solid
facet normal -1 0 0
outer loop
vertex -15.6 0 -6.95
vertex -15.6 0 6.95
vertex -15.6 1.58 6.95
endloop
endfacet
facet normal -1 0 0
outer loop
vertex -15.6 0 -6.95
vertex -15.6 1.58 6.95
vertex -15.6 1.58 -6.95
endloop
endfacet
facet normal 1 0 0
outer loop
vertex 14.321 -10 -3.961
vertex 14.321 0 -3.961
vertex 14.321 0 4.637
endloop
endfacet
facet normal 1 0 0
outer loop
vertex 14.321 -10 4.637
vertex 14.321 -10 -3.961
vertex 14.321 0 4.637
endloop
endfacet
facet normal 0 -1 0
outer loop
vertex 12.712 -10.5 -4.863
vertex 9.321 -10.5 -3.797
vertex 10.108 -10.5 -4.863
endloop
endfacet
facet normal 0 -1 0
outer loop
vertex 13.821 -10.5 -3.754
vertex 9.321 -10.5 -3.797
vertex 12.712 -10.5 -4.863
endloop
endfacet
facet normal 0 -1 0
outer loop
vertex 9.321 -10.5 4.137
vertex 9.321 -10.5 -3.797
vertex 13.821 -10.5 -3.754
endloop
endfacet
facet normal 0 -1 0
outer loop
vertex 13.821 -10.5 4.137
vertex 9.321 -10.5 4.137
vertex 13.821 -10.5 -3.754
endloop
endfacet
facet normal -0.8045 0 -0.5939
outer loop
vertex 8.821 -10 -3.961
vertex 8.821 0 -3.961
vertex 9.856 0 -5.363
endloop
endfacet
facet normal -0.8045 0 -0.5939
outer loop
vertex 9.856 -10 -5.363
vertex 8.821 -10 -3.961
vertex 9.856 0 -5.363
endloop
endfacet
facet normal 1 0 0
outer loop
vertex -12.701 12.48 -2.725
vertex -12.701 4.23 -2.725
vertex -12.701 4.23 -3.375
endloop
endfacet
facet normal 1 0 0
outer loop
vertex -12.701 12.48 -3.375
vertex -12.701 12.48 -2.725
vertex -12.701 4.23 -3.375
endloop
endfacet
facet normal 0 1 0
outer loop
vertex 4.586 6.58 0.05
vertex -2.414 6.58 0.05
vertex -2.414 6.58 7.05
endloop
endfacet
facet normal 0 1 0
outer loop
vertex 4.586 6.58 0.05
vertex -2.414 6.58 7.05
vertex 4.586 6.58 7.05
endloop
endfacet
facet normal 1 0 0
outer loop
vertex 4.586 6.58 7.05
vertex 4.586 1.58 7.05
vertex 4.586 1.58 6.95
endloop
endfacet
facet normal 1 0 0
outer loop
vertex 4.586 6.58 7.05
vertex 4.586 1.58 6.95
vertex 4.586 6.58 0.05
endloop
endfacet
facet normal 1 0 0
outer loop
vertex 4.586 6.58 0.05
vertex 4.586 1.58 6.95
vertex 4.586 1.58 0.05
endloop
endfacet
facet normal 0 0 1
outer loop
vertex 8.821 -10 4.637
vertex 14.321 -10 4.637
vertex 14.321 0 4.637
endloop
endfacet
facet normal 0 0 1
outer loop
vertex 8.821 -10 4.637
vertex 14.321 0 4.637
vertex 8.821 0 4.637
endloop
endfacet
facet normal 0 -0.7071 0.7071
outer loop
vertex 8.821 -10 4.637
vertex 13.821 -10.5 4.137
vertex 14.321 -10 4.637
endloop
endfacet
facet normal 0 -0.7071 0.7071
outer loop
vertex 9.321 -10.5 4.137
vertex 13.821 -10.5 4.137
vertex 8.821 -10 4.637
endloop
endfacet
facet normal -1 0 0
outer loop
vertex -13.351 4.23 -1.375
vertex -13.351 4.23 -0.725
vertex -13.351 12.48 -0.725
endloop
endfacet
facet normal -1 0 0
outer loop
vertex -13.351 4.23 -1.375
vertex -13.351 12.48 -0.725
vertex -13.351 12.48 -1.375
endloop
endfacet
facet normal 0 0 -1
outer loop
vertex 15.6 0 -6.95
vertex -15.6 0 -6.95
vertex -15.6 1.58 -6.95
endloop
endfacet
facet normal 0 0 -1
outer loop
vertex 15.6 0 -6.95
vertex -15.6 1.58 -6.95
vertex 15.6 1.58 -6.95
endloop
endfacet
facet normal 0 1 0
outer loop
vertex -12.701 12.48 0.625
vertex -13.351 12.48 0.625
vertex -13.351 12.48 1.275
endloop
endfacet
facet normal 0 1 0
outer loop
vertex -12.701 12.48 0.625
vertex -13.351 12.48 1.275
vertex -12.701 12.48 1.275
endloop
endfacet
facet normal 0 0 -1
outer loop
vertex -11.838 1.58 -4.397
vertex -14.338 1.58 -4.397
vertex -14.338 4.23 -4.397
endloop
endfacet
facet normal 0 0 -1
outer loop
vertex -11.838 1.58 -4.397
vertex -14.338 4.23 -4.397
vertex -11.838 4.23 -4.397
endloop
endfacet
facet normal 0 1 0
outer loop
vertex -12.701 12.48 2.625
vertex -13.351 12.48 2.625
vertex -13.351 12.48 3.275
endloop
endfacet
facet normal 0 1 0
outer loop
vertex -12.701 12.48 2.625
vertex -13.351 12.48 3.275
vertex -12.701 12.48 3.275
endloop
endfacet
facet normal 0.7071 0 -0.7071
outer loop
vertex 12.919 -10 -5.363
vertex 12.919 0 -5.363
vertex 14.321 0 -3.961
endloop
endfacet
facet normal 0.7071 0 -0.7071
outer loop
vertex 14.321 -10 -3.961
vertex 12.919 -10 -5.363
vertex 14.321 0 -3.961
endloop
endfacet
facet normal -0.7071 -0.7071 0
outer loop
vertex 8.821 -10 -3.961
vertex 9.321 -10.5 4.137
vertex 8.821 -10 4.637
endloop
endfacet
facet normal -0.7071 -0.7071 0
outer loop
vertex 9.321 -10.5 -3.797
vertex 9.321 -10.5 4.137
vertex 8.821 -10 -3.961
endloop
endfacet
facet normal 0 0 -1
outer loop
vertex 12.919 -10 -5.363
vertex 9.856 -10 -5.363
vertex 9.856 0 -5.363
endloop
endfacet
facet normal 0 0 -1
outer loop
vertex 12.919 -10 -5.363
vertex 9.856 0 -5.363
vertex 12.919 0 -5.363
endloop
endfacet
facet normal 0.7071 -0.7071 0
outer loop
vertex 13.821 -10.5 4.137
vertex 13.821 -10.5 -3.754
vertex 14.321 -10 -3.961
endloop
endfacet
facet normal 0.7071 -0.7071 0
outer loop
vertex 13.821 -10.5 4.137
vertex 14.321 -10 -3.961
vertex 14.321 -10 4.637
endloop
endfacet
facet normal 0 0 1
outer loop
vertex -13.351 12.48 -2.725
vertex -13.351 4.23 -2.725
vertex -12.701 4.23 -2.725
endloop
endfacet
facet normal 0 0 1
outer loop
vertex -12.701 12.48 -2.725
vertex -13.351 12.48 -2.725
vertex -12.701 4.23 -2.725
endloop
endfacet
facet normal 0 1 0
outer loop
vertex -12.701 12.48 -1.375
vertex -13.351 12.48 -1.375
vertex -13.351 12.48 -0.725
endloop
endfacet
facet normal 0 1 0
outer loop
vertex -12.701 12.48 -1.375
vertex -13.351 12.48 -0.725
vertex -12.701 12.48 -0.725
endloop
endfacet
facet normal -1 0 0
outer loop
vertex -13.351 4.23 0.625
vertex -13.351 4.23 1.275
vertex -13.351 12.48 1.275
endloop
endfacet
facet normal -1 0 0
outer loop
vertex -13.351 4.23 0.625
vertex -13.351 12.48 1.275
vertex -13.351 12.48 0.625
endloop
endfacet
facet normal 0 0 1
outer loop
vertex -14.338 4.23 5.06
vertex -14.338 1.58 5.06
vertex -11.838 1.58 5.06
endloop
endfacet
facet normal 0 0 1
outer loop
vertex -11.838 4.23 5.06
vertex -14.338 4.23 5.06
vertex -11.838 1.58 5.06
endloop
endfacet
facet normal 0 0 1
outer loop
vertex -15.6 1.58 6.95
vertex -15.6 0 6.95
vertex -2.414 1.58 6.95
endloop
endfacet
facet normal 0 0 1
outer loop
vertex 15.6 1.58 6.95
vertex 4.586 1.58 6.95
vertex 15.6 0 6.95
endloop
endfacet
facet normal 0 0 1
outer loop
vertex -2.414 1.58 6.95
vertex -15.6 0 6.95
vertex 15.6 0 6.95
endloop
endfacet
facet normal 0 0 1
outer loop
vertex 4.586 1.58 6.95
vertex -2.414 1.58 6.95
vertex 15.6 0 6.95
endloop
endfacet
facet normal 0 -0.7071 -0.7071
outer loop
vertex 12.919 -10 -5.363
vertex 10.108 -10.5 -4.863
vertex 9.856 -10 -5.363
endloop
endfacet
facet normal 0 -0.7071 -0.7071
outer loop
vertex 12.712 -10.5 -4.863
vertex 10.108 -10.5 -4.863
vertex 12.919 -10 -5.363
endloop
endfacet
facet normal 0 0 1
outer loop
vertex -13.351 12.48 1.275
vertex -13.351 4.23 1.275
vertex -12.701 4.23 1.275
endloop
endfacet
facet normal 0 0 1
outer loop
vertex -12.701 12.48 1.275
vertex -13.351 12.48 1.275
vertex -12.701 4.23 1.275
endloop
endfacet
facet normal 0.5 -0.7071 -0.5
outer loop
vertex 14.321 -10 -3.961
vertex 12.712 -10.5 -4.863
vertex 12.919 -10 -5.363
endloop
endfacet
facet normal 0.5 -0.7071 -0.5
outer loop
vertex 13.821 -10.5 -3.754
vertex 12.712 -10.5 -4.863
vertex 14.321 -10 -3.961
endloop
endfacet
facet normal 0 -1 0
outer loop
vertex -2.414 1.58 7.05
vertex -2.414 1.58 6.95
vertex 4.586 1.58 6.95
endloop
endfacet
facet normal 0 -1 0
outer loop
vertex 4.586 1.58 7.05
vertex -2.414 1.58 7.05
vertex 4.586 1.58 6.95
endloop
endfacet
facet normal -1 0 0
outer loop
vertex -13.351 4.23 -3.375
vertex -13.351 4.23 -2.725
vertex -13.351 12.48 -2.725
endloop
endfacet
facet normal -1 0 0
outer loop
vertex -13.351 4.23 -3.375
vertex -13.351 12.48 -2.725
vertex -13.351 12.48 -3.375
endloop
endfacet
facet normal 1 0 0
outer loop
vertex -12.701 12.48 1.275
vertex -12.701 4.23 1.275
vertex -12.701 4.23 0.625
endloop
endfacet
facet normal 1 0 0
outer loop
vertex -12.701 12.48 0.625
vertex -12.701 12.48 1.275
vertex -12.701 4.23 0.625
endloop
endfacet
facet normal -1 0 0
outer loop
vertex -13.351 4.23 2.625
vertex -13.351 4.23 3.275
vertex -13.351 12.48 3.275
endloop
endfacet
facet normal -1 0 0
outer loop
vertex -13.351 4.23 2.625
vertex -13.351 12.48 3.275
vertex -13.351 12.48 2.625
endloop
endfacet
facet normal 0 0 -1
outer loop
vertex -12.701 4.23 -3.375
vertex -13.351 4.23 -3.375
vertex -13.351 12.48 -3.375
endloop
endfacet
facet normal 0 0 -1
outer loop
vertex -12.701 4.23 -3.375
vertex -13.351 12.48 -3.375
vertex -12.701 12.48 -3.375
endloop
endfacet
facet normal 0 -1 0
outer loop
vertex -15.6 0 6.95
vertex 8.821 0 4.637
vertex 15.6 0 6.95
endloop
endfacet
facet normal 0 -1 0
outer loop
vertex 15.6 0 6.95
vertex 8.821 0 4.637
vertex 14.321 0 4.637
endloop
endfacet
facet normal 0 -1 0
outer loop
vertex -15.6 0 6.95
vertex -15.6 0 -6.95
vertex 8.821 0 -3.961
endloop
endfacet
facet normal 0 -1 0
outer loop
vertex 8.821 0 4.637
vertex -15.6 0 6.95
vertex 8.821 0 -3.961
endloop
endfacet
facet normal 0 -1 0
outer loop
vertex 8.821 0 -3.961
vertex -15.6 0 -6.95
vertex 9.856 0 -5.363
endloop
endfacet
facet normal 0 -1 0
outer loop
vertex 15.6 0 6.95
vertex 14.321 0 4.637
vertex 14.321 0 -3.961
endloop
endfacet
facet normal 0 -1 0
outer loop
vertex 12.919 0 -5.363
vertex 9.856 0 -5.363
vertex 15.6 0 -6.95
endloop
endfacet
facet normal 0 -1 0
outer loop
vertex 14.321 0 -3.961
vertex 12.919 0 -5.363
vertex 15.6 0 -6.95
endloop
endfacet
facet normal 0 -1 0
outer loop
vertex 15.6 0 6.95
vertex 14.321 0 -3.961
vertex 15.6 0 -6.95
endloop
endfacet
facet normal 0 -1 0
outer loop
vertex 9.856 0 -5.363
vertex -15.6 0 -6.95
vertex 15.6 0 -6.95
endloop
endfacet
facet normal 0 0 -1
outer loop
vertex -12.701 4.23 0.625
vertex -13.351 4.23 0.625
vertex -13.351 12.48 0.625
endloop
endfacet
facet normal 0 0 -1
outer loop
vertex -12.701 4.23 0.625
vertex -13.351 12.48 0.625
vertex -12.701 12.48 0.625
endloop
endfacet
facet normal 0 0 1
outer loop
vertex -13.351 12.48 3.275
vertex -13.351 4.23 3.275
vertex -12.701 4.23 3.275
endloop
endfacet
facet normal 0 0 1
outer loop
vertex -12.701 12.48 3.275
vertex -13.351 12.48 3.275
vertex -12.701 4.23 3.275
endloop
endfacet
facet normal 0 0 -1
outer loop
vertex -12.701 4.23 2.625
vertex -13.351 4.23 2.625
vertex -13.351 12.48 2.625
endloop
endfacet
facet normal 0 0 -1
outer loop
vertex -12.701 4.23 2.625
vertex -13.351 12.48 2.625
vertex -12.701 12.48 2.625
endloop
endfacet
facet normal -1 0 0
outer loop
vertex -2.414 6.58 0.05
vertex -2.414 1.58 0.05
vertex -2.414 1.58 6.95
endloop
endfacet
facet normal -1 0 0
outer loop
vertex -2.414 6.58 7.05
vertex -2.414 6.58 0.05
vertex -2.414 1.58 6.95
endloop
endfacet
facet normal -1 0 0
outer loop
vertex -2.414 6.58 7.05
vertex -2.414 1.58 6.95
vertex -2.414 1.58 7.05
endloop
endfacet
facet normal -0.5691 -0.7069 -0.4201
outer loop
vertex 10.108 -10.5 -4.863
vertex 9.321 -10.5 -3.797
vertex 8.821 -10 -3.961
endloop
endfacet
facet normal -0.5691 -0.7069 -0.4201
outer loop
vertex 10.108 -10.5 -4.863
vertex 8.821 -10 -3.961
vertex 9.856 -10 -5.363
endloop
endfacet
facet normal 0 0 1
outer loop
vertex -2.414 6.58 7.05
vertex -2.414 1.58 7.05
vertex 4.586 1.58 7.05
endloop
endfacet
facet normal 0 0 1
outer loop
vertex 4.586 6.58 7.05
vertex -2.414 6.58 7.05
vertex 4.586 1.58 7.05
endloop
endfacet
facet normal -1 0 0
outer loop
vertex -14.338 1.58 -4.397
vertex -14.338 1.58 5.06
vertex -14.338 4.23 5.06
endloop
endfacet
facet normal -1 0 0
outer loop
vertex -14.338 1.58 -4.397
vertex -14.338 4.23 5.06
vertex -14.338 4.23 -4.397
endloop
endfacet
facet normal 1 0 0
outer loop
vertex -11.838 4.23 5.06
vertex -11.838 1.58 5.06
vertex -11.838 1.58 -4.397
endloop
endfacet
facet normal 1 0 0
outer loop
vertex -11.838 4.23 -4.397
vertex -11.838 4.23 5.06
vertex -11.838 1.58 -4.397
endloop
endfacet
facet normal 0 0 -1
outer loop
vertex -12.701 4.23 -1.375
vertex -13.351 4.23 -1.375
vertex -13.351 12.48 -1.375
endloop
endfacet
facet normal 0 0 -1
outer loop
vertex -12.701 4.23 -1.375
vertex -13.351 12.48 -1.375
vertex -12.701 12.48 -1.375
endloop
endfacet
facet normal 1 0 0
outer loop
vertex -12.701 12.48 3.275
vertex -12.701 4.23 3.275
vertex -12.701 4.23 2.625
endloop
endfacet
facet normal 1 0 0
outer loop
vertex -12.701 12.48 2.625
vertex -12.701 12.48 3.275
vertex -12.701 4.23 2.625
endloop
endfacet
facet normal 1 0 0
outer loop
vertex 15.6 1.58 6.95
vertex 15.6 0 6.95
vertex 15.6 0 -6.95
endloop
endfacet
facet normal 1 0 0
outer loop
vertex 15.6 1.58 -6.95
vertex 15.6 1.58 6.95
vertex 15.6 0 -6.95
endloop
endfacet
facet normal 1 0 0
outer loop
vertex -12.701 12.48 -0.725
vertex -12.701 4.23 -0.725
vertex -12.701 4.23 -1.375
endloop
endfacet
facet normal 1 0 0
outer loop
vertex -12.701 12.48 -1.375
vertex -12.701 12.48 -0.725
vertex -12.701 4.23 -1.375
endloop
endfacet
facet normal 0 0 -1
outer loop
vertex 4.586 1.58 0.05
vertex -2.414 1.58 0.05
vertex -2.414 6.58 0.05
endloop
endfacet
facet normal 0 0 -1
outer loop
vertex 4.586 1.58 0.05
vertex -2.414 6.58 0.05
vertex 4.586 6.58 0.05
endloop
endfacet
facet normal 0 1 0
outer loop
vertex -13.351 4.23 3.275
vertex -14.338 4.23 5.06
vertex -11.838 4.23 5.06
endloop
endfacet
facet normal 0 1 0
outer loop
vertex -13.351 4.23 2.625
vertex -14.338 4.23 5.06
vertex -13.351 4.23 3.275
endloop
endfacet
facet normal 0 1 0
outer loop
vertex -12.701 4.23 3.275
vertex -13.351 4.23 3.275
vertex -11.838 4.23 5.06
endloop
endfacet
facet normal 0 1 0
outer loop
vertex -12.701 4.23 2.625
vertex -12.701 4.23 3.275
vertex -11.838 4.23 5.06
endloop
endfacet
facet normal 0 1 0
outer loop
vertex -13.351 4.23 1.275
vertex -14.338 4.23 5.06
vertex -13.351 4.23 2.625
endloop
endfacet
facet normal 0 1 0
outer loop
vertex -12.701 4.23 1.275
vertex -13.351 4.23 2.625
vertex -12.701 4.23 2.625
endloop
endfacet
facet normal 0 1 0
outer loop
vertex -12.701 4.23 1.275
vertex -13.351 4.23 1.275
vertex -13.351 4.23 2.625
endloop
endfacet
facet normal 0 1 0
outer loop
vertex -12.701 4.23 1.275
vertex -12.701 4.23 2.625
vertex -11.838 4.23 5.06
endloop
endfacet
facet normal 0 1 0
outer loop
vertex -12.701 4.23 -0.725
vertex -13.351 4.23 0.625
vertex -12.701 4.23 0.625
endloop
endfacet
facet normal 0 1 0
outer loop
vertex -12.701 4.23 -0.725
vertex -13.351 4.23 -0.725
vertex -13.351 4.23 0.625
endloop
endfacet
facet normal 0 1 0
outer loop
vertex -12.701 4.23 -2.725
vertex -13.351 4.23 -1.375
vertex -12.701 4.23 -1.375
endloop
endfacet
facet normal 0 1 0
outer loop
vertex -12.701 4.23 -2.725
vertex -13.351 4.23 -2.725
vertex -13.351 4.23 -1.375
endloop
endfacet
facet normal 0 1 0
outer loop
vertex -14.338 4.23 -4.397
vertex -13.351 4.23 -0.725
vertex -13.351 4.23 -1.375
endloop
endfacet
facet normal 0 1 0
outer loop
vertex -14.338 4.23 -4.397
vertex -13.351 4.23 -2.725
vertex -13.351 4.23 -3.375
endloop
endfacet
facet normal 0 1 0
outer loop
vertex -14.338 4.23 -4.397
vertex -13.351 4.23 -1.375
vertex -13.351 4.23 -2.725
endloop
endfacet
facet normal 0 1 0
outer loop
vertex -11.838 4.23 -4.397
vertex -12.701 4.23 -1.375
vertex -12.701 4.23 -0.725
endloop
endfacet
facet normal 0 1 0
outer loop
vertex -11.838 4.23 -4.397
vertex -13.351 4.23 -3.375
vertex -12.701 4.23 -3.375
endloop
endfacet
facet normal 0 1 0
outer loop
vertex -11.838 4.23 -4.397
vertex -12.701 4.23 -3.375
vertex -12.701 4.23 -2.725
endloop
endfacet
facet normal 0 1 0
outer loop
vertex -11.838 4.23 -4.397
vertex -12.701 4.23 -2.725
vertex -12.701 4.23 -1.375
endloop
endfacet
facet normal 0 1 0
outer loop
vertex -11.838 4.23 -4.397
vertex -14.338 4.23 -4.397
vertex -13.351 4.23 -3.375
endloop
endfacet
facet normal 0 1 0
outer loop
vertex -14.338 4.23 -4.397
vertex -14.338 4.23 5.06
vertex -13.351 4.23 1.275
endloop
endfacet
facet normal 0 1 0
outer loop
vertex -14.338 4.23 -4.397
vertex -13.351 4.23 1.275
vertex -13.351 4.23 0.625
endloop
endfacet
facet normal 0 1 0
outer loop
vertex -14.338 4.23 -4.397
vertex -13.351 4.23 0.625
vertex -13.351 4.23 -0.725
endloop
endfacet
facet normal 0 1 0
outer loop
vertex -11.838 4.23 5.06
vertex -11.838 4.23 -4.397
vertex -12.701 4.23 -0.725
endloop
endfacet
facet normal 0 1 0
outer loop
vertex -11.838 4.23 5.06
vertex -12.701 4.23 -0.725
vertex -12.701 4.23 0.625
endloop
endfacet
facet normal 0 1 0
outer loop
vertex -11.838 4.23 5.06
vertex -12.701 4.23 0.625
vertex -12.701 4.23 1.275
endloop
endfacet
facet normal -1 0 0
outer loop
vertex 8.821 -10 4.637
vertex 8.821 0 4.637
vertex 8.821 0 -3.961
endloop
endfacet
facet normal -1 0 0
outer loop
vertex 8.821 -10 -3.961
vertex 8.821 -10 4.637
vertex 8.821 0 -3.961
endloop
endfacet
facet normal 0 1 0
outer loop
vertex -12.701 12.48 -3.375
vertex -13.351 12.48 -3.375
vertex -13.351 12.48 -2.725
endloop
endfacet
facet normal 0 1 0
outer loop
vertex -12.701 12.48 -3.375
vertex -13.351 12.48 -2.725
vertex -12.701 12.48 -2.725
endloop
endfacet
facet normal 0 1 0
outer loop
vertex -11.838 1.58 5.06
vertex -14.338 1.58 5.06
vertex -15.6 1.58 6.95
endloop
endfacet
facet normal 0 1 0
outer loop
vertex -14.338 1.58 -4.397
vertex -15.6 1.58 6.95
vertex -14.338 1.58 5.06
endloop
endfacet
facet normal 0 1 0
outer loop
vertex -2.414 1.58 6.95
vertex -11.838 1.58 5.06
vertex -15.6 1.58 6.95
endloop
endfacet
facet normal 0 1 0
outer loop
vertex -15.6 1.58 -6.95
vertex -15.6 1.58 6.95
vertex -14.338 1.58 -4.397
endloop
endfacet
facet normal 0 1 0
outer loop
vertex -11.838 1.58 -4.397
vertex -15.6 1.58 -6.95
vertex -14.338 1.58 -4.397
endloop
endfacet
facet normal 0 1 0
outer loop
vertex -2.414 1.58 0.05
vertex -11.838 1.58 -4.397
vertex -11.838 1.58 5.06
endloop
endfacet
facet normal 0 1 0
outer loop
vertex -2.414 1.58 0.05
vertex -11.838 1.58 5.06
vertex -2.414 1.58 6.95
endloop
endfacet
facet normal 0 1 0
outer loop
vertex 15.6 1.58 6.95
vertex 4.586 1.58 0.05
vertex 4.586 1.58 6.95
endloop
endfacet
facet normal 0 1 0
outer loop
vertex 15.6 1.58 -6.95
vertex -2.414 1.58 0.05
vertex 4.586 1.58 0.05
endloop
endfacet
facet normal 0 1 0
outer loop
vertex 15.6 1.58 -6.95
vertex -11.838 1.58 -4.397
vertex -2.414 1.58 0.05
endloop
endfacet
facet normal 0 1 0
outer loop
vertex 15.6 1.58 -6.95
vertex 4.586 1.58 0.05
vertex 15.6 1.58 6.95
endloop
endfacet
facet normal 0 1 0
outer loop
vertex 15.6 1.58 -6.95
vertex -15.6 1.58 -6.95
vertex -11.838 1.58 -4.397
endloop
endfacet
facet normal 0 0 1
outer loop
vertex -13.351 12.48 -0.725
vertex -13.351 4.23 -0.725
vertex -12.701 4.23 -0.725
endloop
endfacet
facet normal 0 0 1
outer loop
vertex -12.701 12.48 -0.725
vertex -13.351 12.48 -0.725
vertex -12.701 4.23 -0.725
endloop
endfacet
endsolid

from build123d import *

# Parameters (mm, degrees)
ESBO_O1_W                = 31.2
ESBO_O1_H                = 13.9
RESSALTO_EXTRUS_O1_DEPTH = 1.58
ESBO_O2_W                = 7
ESBO_O2_H                = 6.9
ESBO_O2_H_2              = 0.1
RESSALTO_EXTRUS_O2_DEPTH = 5
RESSALTO_EXTRUS_O3_DEPTH = 10.5
CHANFRO1_SIZE            = 0.5
ESBO_O4_W                = 2.5
ESBO_O4_H                = 9.457135355
RESSALTO_EXTRUS_O4_DEPTH = 2.65
ESBO_O5_W                = 0.65
ESBO_O5_H                = 0.65
RESSALTO_EXTRUS_O5_DEPTH = 8.25
PADR_O_LINEAR1_COUNT     = 4
PADR_O_LINEAR1_PITCH     = 2


with BuildPart() as part:
    # Esboço1 → Ressalto-extrusão1 (new body)
    with BuildSketch(Plane(origin=(0, 0, 0), x_dir=(1, 0, 0), z_dir=(0, 1, 0))):
        Rectangle(ESBO_O1_W, ESBO_O1_H)
    extrude(amount=RESSALTO_EXTRUS_O1_DEPTH)

    # Esboço2 → Ressalto-extrusão2 (add)
    with BuildSketch(Plane(origin=(0, 1.58, 0), x_dir=(1, 0, 0), z_dir=(0, 1, 0))):
        with Locations((1.086462839, -3.5)):
            Rectangle(ESBO_O2_W, ESBO_O2_H)
        with Locations((1.086462839, -7)):
            Rectangle(ESBO_O2_W, ESBO_O2_H_2)
    extrude(amount=RESSALTO_EXTRUS_O2_DEPTH)

    # Esboço3 → Ressalto-extrusão3 (add)
    with BuildSketch(Plane.XZ):
        Polygon((12.918626435, -5.363327787), (14.320868257, -3.961085964), (14.320868257, 4.636672213), (8.820868257, 4.636672213), (8.820868257, -3.961085964), (9.855714298, -5.363327787), align=None)
    extrude(amount=RESSALTO_EXTRUS_O3_DEPTH)

    # Chanfro1
    chanfro1_edges = [part.edges().sort_by_distance(p)[0] for p in [
        (11.570868257, -10.5, 4.636672213),
        (8.820868257, -10.5, 0.337793125),
        (9.338291278, -10.5, -4.662206875),
        (11.387170366, -10.5, -5.363327787),
        (13.619747346, -10.5, -4.662206875),
        (14.320868257, -10.5, 0.337793125),
    ]]
    chamfer(chanfro1_edges, length=CHANFRO1_SIZE)

    # Esboço4 → Ressalto-extrusão4 (add)
    with BuildSketch(Plane(origin=(0, 1.58, 0), x_dir=(1, 0, 0), z_dir=(0, 1, 0))):
        with Locations((-13.088241827, -0.331483756)):
            Rectangle(ESBO_O4_W, ESBO_O4_H)
    extrude(amount=RESSALTO_EXTRUS_O4_DEPTH)

    # Esboço5 → Ressalto-extrusão5 (add)
    with BuildSketch(Plane(origin=(0, 4.23, 0), x_dir=(1, 0, 0), z_dir=(0, 1, 0))):
        with Locations((-13.025924603, 3.050020292)):
            Rectangle(ESBO_O5_W, ESBO_O5_H)
    ressalto_extrus_o5 = extrude(amount=RESSALTO_EXTRUS_O5_DEPTH)

    # Padrão linear1: Ressalto-extrusão5 ×4
    with Locations(*[(0, 0, i * PADR_O_LINEAR1_PITCH) for i in range(1, PADR_O_LINEAR1_COUNT)]):
        add(ressalto_extrus_o5)


solid = part.part
